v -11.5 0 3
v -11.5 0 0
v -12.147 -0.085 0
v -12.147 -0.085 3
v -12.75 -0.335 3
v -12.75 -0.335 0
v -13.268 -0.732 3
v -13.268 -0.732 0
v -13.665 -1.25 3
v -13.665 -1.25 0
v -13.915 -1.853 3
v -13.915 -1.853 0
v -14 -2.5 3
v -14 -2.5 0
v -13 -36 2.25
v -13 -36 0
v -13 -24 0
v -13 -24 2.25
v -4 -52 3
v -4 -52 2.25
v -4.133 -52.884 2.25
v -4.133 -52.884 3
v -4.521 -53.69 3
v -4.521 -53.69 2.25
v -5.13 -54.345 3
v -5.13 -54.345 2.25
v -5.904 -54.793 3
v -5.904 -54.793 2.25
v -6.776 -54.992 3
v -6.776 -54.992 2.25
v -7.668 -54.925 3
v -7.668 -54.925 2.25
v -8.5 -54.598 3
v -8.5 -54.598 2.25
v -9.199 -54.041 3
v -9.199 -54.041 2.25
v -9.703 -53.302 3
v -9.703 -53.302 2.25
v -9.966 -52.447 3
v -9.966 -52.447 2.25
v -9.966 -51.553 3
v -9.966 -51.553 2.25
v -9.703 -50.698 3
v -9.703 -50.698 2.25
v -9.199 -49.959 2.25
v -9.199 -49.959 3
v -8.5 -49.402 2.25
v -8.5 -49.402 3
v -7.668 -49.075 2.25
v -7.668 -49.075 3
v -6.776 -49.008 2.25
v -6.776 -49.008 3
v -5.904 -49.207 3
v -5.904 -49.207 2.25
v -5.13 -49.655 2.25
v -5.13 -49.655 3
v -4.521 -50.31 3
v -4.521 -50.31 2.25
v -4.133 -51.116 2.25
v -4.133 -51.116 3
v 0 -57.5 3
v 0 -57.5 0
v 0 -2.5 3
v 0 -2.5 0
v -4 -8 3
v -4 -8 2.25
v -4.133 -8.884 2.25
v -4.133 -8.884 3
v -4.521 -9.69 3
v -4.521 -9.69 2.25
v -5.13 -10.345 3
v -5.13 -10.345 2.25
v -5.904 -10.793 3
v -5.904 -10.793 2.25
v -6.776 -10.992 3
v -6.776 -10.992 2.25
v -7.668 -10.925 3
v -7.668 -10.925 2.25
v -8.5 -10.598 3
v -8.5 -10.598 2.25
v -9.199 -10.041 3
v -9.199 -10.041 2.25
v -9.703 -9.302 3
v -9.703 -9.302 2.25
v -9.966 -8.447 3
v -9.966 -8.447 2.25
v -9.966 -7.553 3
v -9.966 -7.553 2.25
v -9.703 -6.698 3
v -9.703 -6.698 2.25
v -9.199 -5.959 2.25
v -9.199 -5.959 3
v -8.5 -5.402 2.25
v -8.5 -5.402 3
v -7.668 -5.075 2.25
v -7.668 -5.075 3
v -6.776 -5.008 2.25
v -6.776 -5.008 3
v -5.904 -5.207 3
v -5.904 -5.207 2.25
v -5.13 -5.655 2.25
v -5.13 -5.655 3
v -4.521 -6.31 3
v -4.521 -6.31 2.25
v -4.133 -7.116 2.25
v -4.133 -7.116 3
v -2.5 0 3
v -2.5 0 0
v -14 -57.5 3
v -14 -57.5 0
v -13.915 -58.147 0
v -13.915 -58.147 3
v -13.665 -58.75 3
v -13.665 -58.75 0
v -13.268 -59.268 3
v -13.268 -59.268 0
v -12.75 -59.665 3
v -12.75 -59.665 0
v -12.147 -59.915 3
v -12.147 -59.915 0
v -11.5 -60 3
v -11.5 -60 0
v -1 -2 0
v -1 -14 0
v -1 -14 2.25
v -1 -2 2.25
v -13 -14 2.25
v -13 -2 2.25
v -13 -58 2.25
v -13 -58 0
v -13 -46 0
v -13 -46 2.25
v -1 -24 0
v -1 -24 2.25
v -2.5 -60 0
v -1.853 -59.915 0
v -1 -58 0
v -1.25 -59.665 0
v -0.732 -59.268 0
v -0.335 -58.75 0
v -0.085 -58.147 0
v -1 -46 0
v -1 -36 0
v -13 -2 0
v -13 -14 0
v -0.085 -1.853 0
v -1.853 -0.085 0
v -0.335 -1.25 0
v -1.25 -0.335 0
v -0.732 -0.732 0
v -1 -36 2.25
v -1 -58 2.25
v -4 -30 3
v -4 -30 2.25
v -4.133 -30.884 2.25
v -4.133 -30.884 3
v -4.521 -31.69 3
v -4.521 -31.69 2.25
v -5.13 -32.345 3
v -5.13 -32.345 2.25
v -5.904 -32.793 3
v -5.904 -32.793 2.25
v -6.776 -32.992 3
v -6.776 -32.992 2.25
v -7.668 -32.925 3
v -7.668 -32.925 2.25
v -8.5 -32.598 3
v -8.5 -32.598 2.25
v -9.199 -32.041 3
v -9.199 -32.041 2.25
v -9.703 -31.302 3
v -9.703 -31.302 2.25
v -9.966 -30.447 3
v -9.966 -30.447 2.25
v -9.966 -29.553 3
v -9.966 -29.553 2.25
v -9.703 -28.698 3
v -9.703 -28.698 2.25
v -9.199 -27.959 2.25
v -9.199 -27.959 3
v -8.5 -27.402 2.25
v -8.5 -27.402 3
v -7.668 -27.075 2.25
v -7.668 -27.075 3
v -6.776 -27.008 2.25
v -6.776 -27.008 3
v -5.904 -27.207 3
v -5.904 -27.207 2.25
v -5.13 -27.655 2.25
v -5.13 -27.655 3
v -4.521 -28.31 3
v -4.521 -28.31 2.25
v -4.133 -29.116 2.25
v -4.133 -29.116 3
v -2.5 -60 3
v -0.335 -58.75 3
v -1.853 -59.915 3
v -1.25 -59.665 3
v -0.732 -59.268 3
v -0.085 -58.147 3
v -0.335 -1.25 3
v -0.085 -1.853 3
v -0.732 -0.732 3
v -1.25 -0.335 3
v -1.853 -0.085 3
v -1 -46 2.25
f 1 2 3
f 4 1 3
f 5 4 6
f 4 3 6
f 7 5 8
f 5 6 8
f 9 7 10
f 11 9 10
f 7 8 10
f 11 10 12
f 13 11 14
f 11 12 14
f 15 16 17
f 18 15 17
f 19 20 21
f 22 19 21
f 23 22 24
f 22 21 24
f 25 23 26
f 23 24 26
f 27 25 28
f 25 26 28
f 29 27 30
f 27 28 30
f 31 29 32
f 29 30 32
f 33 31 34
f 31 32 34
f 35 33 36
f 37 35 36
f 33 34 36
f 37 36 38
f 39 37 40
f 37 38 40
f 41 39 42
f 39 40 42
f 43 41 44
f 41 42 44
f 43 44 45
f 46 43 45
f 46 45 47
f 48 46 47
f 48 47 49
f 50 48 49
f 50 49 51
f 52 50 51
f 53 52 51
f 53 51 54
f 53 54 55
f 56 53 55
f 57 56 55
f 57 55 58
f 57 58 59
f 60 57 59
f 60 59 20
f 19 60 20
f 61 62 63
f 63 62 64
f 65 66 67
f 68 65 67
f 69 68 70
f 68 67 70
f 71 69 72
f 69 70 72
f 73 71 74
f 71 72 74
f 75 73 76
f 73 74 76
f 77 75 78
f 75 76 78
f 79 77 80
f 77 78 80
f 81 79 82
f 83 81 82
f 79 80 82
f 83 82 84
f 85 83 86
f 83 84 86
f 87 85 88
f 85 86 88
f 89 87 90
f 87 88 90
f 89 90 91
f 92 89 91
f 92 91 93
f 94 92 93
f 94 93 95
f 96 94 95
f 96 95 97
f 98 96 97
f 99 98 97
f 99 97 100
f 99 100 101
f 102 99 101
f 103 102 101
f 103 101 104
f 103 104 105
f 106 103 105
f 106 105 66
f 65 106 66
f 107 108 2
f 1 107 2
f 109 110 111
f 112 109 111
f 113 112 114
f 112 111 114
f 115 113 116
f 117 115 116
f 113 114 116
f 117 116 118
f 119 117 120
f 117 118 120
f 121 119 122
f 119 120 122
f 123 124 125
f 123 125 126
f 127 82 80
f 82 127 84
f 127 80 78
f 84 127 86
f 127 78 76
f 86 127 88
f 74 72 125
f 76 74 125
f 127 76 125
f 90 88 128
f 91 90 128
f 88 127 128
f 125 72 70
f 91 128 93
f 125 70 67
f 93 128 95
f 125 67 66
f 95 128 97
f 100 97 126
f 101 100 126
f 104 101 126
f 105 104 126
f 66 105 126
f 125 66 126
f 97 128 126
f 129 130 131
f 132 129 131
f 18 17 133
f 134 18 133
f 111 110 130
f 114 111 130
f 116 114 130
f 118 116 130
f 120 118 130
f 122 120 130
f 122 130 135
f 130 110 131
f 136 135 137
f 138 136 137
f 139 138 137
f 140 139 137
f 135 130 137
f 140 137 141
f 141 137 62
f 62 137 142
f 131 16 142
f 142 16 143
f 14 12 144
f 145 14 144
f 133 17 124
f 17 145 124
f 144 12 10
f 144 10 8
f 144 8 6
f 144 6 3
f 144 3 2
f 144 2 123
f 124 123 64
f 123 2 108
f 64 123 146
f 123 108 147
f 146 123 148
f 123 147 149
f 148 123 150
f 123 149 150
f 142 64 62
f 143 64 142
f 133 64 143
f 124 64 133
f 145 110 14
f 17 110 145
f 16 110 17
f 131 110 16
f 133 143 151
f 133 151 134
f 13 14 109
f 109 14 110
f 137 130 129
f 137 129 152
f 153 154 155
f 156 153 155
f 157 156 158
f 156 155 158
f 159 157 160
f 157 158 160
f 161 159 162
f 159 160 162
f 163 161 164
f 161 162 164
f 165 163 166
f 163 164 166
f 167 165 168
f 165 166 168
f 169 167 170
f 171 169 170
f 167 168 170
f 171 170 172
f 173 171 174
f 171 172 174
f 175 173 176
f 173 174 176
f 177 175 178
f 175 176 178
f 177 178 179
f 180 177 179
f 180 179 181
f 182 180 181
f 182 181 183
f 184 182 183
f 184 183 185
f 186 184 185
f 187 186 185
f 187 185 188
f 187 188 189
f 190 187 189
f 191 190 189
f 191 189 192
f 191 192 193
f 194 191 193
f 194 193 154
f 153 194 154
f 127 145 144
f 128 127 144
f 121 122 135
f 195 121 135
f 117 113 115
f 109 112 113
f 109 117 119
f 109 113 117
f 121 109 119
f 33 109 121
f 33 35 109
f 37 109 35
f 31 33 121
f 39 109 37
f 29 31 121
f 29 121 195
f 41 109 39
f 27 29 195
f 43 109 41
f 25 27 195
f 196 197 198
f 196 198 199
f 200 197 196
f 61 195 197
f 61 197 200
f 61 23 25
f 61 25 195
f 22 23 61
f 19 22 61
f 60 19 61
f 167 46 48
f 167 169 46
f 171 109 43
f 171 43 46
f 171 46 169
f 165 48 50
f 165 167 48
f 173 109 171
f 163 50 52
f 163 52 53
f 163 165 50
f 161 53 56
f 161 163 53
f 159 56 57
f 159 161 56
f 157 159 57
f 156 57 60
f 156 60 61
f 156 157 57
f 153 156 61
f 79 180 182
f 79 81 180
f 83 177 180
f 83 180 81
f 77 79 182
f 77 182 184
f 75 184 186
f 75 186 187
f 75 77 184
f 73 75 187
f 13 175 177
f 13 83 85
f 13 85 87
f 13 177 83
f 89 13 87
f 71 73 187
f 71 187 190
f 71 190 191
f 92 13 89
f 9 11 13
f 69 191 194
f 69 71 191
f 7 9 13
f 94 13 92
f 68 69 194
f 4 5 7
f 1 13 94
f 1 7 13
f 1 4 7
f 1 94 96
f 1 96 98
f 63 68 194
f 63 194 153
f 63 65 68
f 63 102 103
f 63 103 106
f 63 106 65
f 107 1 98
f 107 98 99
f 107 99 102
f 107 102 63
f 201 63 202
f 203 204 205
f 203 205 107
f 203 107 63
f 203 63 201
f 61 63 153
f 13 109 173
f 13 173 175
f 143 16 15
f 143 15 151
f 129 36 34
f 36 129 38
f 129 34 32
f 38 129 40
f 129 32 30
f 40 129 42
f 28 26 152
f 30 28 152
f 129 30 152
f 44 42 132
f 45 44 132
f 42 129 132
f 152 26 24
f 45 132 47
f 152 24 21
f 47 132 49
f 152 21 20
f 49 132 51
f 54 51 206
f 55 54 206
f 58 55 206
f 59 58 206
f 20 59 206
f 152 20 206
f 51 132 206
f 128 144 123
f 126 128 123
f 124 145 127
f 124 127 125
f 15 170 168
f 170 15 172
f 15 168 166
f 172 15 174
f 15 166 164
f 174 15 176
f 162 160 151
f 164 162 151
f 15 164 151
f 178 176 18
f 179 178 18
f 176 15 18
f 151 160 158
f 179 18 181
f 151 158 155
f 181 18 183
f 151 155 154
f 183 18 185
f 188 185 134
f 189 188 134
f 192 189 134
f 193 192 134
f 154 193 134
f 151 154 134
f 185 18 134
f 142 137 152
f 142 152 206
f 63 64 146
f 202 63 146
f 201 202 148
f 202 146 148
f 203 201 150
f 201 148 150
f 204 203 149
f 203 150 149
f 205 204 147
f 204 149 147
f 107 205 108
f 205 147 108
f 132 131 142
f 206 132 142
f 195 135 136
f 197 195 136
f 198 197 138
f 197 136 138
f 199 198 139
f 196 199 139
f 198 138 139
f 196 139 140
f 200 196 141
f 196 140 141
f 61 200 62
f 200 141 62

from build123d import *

# Parameters (mm, degrees)
SKETCH_W     = 12
SKETCH_H     = 12
PAD_DEPTH    = 3
SKETCH001_W  = 12.427667
SKETCH001_H  = 57.473638
PAD001_DEPTH = 0.75
SKETCH002_R  = 3
HOLE_DEPTH   = 25


with BuildPart() as part:
    # Sketch → Pad (new body)
    with BuildSketch(Plane.XY):
        with BuildLine():
            Line((-11.5, -60), (-2.5, -60))
            ThreePointArc((-2.5, -60), (-0.732233, -59.267767), (0, -57.5))
            Line((0, -57.5), (0, -2.5))
            ThreePointArc((0, -2.5), (-0.732233, -0.732233), (-2.5, 0))
            Line((-2.5, 0), (-11.5, 0))
            ThreePointArc((-11.5, 0), (-13.267767, -0.732233), (-14, -2.5))
            Line((-14, -2.5), (-14, -57.5))
            ThreePointArc((-14, -57.5), (-13.267767, -59.267767), (-11.5, -60))
        make_face()
        with Locations((-7, -52)):
            Rectangle(SKETCH_W, SKETCH_H, mode=Mode.SUBTRACT)
        with Locations((-7, -30)):
            Rectangle(SKETCH_W, SKETCH_H, mode=Mode.SUBTRACT)
        with Locations((-7, -8)):
            Rectangle(SKETCH_W, SKETCH_H, mode=Mode.SUBTRACT)
    extrude(amount=PAD_DEPTH)

    # Sketch001 (on Face22 of Pad) → Pad001 (join)
    with BuildSketch(Plane.XY.offset(3)):
        with Locations((-6.943834, -29.736819)):
            Rectangle(SKETCH001_W, SKETCH001_H)
    extrude(amount=-PAD001_DEPTH)

    # Sketch002 (on Face23 of Pad001) → Hole (cut)
    with BuildSketch(Plane(origin=(0, 0, 2.25), x_dir=(1, 0, 0), z_dir=(0, 0, -1))):
        with Locations((-7, 30)):
            Circle(SKETCH002_R)
        with Locations((-7, 52)):
            Circle(SKETCH002_R)
        with Locations((-7, 8)):
            Circle(SKETCH002_R)
    extrude(amount=-HOLE_DEPTH, mode=Mode.SUBTRACT)


solid = part.part
